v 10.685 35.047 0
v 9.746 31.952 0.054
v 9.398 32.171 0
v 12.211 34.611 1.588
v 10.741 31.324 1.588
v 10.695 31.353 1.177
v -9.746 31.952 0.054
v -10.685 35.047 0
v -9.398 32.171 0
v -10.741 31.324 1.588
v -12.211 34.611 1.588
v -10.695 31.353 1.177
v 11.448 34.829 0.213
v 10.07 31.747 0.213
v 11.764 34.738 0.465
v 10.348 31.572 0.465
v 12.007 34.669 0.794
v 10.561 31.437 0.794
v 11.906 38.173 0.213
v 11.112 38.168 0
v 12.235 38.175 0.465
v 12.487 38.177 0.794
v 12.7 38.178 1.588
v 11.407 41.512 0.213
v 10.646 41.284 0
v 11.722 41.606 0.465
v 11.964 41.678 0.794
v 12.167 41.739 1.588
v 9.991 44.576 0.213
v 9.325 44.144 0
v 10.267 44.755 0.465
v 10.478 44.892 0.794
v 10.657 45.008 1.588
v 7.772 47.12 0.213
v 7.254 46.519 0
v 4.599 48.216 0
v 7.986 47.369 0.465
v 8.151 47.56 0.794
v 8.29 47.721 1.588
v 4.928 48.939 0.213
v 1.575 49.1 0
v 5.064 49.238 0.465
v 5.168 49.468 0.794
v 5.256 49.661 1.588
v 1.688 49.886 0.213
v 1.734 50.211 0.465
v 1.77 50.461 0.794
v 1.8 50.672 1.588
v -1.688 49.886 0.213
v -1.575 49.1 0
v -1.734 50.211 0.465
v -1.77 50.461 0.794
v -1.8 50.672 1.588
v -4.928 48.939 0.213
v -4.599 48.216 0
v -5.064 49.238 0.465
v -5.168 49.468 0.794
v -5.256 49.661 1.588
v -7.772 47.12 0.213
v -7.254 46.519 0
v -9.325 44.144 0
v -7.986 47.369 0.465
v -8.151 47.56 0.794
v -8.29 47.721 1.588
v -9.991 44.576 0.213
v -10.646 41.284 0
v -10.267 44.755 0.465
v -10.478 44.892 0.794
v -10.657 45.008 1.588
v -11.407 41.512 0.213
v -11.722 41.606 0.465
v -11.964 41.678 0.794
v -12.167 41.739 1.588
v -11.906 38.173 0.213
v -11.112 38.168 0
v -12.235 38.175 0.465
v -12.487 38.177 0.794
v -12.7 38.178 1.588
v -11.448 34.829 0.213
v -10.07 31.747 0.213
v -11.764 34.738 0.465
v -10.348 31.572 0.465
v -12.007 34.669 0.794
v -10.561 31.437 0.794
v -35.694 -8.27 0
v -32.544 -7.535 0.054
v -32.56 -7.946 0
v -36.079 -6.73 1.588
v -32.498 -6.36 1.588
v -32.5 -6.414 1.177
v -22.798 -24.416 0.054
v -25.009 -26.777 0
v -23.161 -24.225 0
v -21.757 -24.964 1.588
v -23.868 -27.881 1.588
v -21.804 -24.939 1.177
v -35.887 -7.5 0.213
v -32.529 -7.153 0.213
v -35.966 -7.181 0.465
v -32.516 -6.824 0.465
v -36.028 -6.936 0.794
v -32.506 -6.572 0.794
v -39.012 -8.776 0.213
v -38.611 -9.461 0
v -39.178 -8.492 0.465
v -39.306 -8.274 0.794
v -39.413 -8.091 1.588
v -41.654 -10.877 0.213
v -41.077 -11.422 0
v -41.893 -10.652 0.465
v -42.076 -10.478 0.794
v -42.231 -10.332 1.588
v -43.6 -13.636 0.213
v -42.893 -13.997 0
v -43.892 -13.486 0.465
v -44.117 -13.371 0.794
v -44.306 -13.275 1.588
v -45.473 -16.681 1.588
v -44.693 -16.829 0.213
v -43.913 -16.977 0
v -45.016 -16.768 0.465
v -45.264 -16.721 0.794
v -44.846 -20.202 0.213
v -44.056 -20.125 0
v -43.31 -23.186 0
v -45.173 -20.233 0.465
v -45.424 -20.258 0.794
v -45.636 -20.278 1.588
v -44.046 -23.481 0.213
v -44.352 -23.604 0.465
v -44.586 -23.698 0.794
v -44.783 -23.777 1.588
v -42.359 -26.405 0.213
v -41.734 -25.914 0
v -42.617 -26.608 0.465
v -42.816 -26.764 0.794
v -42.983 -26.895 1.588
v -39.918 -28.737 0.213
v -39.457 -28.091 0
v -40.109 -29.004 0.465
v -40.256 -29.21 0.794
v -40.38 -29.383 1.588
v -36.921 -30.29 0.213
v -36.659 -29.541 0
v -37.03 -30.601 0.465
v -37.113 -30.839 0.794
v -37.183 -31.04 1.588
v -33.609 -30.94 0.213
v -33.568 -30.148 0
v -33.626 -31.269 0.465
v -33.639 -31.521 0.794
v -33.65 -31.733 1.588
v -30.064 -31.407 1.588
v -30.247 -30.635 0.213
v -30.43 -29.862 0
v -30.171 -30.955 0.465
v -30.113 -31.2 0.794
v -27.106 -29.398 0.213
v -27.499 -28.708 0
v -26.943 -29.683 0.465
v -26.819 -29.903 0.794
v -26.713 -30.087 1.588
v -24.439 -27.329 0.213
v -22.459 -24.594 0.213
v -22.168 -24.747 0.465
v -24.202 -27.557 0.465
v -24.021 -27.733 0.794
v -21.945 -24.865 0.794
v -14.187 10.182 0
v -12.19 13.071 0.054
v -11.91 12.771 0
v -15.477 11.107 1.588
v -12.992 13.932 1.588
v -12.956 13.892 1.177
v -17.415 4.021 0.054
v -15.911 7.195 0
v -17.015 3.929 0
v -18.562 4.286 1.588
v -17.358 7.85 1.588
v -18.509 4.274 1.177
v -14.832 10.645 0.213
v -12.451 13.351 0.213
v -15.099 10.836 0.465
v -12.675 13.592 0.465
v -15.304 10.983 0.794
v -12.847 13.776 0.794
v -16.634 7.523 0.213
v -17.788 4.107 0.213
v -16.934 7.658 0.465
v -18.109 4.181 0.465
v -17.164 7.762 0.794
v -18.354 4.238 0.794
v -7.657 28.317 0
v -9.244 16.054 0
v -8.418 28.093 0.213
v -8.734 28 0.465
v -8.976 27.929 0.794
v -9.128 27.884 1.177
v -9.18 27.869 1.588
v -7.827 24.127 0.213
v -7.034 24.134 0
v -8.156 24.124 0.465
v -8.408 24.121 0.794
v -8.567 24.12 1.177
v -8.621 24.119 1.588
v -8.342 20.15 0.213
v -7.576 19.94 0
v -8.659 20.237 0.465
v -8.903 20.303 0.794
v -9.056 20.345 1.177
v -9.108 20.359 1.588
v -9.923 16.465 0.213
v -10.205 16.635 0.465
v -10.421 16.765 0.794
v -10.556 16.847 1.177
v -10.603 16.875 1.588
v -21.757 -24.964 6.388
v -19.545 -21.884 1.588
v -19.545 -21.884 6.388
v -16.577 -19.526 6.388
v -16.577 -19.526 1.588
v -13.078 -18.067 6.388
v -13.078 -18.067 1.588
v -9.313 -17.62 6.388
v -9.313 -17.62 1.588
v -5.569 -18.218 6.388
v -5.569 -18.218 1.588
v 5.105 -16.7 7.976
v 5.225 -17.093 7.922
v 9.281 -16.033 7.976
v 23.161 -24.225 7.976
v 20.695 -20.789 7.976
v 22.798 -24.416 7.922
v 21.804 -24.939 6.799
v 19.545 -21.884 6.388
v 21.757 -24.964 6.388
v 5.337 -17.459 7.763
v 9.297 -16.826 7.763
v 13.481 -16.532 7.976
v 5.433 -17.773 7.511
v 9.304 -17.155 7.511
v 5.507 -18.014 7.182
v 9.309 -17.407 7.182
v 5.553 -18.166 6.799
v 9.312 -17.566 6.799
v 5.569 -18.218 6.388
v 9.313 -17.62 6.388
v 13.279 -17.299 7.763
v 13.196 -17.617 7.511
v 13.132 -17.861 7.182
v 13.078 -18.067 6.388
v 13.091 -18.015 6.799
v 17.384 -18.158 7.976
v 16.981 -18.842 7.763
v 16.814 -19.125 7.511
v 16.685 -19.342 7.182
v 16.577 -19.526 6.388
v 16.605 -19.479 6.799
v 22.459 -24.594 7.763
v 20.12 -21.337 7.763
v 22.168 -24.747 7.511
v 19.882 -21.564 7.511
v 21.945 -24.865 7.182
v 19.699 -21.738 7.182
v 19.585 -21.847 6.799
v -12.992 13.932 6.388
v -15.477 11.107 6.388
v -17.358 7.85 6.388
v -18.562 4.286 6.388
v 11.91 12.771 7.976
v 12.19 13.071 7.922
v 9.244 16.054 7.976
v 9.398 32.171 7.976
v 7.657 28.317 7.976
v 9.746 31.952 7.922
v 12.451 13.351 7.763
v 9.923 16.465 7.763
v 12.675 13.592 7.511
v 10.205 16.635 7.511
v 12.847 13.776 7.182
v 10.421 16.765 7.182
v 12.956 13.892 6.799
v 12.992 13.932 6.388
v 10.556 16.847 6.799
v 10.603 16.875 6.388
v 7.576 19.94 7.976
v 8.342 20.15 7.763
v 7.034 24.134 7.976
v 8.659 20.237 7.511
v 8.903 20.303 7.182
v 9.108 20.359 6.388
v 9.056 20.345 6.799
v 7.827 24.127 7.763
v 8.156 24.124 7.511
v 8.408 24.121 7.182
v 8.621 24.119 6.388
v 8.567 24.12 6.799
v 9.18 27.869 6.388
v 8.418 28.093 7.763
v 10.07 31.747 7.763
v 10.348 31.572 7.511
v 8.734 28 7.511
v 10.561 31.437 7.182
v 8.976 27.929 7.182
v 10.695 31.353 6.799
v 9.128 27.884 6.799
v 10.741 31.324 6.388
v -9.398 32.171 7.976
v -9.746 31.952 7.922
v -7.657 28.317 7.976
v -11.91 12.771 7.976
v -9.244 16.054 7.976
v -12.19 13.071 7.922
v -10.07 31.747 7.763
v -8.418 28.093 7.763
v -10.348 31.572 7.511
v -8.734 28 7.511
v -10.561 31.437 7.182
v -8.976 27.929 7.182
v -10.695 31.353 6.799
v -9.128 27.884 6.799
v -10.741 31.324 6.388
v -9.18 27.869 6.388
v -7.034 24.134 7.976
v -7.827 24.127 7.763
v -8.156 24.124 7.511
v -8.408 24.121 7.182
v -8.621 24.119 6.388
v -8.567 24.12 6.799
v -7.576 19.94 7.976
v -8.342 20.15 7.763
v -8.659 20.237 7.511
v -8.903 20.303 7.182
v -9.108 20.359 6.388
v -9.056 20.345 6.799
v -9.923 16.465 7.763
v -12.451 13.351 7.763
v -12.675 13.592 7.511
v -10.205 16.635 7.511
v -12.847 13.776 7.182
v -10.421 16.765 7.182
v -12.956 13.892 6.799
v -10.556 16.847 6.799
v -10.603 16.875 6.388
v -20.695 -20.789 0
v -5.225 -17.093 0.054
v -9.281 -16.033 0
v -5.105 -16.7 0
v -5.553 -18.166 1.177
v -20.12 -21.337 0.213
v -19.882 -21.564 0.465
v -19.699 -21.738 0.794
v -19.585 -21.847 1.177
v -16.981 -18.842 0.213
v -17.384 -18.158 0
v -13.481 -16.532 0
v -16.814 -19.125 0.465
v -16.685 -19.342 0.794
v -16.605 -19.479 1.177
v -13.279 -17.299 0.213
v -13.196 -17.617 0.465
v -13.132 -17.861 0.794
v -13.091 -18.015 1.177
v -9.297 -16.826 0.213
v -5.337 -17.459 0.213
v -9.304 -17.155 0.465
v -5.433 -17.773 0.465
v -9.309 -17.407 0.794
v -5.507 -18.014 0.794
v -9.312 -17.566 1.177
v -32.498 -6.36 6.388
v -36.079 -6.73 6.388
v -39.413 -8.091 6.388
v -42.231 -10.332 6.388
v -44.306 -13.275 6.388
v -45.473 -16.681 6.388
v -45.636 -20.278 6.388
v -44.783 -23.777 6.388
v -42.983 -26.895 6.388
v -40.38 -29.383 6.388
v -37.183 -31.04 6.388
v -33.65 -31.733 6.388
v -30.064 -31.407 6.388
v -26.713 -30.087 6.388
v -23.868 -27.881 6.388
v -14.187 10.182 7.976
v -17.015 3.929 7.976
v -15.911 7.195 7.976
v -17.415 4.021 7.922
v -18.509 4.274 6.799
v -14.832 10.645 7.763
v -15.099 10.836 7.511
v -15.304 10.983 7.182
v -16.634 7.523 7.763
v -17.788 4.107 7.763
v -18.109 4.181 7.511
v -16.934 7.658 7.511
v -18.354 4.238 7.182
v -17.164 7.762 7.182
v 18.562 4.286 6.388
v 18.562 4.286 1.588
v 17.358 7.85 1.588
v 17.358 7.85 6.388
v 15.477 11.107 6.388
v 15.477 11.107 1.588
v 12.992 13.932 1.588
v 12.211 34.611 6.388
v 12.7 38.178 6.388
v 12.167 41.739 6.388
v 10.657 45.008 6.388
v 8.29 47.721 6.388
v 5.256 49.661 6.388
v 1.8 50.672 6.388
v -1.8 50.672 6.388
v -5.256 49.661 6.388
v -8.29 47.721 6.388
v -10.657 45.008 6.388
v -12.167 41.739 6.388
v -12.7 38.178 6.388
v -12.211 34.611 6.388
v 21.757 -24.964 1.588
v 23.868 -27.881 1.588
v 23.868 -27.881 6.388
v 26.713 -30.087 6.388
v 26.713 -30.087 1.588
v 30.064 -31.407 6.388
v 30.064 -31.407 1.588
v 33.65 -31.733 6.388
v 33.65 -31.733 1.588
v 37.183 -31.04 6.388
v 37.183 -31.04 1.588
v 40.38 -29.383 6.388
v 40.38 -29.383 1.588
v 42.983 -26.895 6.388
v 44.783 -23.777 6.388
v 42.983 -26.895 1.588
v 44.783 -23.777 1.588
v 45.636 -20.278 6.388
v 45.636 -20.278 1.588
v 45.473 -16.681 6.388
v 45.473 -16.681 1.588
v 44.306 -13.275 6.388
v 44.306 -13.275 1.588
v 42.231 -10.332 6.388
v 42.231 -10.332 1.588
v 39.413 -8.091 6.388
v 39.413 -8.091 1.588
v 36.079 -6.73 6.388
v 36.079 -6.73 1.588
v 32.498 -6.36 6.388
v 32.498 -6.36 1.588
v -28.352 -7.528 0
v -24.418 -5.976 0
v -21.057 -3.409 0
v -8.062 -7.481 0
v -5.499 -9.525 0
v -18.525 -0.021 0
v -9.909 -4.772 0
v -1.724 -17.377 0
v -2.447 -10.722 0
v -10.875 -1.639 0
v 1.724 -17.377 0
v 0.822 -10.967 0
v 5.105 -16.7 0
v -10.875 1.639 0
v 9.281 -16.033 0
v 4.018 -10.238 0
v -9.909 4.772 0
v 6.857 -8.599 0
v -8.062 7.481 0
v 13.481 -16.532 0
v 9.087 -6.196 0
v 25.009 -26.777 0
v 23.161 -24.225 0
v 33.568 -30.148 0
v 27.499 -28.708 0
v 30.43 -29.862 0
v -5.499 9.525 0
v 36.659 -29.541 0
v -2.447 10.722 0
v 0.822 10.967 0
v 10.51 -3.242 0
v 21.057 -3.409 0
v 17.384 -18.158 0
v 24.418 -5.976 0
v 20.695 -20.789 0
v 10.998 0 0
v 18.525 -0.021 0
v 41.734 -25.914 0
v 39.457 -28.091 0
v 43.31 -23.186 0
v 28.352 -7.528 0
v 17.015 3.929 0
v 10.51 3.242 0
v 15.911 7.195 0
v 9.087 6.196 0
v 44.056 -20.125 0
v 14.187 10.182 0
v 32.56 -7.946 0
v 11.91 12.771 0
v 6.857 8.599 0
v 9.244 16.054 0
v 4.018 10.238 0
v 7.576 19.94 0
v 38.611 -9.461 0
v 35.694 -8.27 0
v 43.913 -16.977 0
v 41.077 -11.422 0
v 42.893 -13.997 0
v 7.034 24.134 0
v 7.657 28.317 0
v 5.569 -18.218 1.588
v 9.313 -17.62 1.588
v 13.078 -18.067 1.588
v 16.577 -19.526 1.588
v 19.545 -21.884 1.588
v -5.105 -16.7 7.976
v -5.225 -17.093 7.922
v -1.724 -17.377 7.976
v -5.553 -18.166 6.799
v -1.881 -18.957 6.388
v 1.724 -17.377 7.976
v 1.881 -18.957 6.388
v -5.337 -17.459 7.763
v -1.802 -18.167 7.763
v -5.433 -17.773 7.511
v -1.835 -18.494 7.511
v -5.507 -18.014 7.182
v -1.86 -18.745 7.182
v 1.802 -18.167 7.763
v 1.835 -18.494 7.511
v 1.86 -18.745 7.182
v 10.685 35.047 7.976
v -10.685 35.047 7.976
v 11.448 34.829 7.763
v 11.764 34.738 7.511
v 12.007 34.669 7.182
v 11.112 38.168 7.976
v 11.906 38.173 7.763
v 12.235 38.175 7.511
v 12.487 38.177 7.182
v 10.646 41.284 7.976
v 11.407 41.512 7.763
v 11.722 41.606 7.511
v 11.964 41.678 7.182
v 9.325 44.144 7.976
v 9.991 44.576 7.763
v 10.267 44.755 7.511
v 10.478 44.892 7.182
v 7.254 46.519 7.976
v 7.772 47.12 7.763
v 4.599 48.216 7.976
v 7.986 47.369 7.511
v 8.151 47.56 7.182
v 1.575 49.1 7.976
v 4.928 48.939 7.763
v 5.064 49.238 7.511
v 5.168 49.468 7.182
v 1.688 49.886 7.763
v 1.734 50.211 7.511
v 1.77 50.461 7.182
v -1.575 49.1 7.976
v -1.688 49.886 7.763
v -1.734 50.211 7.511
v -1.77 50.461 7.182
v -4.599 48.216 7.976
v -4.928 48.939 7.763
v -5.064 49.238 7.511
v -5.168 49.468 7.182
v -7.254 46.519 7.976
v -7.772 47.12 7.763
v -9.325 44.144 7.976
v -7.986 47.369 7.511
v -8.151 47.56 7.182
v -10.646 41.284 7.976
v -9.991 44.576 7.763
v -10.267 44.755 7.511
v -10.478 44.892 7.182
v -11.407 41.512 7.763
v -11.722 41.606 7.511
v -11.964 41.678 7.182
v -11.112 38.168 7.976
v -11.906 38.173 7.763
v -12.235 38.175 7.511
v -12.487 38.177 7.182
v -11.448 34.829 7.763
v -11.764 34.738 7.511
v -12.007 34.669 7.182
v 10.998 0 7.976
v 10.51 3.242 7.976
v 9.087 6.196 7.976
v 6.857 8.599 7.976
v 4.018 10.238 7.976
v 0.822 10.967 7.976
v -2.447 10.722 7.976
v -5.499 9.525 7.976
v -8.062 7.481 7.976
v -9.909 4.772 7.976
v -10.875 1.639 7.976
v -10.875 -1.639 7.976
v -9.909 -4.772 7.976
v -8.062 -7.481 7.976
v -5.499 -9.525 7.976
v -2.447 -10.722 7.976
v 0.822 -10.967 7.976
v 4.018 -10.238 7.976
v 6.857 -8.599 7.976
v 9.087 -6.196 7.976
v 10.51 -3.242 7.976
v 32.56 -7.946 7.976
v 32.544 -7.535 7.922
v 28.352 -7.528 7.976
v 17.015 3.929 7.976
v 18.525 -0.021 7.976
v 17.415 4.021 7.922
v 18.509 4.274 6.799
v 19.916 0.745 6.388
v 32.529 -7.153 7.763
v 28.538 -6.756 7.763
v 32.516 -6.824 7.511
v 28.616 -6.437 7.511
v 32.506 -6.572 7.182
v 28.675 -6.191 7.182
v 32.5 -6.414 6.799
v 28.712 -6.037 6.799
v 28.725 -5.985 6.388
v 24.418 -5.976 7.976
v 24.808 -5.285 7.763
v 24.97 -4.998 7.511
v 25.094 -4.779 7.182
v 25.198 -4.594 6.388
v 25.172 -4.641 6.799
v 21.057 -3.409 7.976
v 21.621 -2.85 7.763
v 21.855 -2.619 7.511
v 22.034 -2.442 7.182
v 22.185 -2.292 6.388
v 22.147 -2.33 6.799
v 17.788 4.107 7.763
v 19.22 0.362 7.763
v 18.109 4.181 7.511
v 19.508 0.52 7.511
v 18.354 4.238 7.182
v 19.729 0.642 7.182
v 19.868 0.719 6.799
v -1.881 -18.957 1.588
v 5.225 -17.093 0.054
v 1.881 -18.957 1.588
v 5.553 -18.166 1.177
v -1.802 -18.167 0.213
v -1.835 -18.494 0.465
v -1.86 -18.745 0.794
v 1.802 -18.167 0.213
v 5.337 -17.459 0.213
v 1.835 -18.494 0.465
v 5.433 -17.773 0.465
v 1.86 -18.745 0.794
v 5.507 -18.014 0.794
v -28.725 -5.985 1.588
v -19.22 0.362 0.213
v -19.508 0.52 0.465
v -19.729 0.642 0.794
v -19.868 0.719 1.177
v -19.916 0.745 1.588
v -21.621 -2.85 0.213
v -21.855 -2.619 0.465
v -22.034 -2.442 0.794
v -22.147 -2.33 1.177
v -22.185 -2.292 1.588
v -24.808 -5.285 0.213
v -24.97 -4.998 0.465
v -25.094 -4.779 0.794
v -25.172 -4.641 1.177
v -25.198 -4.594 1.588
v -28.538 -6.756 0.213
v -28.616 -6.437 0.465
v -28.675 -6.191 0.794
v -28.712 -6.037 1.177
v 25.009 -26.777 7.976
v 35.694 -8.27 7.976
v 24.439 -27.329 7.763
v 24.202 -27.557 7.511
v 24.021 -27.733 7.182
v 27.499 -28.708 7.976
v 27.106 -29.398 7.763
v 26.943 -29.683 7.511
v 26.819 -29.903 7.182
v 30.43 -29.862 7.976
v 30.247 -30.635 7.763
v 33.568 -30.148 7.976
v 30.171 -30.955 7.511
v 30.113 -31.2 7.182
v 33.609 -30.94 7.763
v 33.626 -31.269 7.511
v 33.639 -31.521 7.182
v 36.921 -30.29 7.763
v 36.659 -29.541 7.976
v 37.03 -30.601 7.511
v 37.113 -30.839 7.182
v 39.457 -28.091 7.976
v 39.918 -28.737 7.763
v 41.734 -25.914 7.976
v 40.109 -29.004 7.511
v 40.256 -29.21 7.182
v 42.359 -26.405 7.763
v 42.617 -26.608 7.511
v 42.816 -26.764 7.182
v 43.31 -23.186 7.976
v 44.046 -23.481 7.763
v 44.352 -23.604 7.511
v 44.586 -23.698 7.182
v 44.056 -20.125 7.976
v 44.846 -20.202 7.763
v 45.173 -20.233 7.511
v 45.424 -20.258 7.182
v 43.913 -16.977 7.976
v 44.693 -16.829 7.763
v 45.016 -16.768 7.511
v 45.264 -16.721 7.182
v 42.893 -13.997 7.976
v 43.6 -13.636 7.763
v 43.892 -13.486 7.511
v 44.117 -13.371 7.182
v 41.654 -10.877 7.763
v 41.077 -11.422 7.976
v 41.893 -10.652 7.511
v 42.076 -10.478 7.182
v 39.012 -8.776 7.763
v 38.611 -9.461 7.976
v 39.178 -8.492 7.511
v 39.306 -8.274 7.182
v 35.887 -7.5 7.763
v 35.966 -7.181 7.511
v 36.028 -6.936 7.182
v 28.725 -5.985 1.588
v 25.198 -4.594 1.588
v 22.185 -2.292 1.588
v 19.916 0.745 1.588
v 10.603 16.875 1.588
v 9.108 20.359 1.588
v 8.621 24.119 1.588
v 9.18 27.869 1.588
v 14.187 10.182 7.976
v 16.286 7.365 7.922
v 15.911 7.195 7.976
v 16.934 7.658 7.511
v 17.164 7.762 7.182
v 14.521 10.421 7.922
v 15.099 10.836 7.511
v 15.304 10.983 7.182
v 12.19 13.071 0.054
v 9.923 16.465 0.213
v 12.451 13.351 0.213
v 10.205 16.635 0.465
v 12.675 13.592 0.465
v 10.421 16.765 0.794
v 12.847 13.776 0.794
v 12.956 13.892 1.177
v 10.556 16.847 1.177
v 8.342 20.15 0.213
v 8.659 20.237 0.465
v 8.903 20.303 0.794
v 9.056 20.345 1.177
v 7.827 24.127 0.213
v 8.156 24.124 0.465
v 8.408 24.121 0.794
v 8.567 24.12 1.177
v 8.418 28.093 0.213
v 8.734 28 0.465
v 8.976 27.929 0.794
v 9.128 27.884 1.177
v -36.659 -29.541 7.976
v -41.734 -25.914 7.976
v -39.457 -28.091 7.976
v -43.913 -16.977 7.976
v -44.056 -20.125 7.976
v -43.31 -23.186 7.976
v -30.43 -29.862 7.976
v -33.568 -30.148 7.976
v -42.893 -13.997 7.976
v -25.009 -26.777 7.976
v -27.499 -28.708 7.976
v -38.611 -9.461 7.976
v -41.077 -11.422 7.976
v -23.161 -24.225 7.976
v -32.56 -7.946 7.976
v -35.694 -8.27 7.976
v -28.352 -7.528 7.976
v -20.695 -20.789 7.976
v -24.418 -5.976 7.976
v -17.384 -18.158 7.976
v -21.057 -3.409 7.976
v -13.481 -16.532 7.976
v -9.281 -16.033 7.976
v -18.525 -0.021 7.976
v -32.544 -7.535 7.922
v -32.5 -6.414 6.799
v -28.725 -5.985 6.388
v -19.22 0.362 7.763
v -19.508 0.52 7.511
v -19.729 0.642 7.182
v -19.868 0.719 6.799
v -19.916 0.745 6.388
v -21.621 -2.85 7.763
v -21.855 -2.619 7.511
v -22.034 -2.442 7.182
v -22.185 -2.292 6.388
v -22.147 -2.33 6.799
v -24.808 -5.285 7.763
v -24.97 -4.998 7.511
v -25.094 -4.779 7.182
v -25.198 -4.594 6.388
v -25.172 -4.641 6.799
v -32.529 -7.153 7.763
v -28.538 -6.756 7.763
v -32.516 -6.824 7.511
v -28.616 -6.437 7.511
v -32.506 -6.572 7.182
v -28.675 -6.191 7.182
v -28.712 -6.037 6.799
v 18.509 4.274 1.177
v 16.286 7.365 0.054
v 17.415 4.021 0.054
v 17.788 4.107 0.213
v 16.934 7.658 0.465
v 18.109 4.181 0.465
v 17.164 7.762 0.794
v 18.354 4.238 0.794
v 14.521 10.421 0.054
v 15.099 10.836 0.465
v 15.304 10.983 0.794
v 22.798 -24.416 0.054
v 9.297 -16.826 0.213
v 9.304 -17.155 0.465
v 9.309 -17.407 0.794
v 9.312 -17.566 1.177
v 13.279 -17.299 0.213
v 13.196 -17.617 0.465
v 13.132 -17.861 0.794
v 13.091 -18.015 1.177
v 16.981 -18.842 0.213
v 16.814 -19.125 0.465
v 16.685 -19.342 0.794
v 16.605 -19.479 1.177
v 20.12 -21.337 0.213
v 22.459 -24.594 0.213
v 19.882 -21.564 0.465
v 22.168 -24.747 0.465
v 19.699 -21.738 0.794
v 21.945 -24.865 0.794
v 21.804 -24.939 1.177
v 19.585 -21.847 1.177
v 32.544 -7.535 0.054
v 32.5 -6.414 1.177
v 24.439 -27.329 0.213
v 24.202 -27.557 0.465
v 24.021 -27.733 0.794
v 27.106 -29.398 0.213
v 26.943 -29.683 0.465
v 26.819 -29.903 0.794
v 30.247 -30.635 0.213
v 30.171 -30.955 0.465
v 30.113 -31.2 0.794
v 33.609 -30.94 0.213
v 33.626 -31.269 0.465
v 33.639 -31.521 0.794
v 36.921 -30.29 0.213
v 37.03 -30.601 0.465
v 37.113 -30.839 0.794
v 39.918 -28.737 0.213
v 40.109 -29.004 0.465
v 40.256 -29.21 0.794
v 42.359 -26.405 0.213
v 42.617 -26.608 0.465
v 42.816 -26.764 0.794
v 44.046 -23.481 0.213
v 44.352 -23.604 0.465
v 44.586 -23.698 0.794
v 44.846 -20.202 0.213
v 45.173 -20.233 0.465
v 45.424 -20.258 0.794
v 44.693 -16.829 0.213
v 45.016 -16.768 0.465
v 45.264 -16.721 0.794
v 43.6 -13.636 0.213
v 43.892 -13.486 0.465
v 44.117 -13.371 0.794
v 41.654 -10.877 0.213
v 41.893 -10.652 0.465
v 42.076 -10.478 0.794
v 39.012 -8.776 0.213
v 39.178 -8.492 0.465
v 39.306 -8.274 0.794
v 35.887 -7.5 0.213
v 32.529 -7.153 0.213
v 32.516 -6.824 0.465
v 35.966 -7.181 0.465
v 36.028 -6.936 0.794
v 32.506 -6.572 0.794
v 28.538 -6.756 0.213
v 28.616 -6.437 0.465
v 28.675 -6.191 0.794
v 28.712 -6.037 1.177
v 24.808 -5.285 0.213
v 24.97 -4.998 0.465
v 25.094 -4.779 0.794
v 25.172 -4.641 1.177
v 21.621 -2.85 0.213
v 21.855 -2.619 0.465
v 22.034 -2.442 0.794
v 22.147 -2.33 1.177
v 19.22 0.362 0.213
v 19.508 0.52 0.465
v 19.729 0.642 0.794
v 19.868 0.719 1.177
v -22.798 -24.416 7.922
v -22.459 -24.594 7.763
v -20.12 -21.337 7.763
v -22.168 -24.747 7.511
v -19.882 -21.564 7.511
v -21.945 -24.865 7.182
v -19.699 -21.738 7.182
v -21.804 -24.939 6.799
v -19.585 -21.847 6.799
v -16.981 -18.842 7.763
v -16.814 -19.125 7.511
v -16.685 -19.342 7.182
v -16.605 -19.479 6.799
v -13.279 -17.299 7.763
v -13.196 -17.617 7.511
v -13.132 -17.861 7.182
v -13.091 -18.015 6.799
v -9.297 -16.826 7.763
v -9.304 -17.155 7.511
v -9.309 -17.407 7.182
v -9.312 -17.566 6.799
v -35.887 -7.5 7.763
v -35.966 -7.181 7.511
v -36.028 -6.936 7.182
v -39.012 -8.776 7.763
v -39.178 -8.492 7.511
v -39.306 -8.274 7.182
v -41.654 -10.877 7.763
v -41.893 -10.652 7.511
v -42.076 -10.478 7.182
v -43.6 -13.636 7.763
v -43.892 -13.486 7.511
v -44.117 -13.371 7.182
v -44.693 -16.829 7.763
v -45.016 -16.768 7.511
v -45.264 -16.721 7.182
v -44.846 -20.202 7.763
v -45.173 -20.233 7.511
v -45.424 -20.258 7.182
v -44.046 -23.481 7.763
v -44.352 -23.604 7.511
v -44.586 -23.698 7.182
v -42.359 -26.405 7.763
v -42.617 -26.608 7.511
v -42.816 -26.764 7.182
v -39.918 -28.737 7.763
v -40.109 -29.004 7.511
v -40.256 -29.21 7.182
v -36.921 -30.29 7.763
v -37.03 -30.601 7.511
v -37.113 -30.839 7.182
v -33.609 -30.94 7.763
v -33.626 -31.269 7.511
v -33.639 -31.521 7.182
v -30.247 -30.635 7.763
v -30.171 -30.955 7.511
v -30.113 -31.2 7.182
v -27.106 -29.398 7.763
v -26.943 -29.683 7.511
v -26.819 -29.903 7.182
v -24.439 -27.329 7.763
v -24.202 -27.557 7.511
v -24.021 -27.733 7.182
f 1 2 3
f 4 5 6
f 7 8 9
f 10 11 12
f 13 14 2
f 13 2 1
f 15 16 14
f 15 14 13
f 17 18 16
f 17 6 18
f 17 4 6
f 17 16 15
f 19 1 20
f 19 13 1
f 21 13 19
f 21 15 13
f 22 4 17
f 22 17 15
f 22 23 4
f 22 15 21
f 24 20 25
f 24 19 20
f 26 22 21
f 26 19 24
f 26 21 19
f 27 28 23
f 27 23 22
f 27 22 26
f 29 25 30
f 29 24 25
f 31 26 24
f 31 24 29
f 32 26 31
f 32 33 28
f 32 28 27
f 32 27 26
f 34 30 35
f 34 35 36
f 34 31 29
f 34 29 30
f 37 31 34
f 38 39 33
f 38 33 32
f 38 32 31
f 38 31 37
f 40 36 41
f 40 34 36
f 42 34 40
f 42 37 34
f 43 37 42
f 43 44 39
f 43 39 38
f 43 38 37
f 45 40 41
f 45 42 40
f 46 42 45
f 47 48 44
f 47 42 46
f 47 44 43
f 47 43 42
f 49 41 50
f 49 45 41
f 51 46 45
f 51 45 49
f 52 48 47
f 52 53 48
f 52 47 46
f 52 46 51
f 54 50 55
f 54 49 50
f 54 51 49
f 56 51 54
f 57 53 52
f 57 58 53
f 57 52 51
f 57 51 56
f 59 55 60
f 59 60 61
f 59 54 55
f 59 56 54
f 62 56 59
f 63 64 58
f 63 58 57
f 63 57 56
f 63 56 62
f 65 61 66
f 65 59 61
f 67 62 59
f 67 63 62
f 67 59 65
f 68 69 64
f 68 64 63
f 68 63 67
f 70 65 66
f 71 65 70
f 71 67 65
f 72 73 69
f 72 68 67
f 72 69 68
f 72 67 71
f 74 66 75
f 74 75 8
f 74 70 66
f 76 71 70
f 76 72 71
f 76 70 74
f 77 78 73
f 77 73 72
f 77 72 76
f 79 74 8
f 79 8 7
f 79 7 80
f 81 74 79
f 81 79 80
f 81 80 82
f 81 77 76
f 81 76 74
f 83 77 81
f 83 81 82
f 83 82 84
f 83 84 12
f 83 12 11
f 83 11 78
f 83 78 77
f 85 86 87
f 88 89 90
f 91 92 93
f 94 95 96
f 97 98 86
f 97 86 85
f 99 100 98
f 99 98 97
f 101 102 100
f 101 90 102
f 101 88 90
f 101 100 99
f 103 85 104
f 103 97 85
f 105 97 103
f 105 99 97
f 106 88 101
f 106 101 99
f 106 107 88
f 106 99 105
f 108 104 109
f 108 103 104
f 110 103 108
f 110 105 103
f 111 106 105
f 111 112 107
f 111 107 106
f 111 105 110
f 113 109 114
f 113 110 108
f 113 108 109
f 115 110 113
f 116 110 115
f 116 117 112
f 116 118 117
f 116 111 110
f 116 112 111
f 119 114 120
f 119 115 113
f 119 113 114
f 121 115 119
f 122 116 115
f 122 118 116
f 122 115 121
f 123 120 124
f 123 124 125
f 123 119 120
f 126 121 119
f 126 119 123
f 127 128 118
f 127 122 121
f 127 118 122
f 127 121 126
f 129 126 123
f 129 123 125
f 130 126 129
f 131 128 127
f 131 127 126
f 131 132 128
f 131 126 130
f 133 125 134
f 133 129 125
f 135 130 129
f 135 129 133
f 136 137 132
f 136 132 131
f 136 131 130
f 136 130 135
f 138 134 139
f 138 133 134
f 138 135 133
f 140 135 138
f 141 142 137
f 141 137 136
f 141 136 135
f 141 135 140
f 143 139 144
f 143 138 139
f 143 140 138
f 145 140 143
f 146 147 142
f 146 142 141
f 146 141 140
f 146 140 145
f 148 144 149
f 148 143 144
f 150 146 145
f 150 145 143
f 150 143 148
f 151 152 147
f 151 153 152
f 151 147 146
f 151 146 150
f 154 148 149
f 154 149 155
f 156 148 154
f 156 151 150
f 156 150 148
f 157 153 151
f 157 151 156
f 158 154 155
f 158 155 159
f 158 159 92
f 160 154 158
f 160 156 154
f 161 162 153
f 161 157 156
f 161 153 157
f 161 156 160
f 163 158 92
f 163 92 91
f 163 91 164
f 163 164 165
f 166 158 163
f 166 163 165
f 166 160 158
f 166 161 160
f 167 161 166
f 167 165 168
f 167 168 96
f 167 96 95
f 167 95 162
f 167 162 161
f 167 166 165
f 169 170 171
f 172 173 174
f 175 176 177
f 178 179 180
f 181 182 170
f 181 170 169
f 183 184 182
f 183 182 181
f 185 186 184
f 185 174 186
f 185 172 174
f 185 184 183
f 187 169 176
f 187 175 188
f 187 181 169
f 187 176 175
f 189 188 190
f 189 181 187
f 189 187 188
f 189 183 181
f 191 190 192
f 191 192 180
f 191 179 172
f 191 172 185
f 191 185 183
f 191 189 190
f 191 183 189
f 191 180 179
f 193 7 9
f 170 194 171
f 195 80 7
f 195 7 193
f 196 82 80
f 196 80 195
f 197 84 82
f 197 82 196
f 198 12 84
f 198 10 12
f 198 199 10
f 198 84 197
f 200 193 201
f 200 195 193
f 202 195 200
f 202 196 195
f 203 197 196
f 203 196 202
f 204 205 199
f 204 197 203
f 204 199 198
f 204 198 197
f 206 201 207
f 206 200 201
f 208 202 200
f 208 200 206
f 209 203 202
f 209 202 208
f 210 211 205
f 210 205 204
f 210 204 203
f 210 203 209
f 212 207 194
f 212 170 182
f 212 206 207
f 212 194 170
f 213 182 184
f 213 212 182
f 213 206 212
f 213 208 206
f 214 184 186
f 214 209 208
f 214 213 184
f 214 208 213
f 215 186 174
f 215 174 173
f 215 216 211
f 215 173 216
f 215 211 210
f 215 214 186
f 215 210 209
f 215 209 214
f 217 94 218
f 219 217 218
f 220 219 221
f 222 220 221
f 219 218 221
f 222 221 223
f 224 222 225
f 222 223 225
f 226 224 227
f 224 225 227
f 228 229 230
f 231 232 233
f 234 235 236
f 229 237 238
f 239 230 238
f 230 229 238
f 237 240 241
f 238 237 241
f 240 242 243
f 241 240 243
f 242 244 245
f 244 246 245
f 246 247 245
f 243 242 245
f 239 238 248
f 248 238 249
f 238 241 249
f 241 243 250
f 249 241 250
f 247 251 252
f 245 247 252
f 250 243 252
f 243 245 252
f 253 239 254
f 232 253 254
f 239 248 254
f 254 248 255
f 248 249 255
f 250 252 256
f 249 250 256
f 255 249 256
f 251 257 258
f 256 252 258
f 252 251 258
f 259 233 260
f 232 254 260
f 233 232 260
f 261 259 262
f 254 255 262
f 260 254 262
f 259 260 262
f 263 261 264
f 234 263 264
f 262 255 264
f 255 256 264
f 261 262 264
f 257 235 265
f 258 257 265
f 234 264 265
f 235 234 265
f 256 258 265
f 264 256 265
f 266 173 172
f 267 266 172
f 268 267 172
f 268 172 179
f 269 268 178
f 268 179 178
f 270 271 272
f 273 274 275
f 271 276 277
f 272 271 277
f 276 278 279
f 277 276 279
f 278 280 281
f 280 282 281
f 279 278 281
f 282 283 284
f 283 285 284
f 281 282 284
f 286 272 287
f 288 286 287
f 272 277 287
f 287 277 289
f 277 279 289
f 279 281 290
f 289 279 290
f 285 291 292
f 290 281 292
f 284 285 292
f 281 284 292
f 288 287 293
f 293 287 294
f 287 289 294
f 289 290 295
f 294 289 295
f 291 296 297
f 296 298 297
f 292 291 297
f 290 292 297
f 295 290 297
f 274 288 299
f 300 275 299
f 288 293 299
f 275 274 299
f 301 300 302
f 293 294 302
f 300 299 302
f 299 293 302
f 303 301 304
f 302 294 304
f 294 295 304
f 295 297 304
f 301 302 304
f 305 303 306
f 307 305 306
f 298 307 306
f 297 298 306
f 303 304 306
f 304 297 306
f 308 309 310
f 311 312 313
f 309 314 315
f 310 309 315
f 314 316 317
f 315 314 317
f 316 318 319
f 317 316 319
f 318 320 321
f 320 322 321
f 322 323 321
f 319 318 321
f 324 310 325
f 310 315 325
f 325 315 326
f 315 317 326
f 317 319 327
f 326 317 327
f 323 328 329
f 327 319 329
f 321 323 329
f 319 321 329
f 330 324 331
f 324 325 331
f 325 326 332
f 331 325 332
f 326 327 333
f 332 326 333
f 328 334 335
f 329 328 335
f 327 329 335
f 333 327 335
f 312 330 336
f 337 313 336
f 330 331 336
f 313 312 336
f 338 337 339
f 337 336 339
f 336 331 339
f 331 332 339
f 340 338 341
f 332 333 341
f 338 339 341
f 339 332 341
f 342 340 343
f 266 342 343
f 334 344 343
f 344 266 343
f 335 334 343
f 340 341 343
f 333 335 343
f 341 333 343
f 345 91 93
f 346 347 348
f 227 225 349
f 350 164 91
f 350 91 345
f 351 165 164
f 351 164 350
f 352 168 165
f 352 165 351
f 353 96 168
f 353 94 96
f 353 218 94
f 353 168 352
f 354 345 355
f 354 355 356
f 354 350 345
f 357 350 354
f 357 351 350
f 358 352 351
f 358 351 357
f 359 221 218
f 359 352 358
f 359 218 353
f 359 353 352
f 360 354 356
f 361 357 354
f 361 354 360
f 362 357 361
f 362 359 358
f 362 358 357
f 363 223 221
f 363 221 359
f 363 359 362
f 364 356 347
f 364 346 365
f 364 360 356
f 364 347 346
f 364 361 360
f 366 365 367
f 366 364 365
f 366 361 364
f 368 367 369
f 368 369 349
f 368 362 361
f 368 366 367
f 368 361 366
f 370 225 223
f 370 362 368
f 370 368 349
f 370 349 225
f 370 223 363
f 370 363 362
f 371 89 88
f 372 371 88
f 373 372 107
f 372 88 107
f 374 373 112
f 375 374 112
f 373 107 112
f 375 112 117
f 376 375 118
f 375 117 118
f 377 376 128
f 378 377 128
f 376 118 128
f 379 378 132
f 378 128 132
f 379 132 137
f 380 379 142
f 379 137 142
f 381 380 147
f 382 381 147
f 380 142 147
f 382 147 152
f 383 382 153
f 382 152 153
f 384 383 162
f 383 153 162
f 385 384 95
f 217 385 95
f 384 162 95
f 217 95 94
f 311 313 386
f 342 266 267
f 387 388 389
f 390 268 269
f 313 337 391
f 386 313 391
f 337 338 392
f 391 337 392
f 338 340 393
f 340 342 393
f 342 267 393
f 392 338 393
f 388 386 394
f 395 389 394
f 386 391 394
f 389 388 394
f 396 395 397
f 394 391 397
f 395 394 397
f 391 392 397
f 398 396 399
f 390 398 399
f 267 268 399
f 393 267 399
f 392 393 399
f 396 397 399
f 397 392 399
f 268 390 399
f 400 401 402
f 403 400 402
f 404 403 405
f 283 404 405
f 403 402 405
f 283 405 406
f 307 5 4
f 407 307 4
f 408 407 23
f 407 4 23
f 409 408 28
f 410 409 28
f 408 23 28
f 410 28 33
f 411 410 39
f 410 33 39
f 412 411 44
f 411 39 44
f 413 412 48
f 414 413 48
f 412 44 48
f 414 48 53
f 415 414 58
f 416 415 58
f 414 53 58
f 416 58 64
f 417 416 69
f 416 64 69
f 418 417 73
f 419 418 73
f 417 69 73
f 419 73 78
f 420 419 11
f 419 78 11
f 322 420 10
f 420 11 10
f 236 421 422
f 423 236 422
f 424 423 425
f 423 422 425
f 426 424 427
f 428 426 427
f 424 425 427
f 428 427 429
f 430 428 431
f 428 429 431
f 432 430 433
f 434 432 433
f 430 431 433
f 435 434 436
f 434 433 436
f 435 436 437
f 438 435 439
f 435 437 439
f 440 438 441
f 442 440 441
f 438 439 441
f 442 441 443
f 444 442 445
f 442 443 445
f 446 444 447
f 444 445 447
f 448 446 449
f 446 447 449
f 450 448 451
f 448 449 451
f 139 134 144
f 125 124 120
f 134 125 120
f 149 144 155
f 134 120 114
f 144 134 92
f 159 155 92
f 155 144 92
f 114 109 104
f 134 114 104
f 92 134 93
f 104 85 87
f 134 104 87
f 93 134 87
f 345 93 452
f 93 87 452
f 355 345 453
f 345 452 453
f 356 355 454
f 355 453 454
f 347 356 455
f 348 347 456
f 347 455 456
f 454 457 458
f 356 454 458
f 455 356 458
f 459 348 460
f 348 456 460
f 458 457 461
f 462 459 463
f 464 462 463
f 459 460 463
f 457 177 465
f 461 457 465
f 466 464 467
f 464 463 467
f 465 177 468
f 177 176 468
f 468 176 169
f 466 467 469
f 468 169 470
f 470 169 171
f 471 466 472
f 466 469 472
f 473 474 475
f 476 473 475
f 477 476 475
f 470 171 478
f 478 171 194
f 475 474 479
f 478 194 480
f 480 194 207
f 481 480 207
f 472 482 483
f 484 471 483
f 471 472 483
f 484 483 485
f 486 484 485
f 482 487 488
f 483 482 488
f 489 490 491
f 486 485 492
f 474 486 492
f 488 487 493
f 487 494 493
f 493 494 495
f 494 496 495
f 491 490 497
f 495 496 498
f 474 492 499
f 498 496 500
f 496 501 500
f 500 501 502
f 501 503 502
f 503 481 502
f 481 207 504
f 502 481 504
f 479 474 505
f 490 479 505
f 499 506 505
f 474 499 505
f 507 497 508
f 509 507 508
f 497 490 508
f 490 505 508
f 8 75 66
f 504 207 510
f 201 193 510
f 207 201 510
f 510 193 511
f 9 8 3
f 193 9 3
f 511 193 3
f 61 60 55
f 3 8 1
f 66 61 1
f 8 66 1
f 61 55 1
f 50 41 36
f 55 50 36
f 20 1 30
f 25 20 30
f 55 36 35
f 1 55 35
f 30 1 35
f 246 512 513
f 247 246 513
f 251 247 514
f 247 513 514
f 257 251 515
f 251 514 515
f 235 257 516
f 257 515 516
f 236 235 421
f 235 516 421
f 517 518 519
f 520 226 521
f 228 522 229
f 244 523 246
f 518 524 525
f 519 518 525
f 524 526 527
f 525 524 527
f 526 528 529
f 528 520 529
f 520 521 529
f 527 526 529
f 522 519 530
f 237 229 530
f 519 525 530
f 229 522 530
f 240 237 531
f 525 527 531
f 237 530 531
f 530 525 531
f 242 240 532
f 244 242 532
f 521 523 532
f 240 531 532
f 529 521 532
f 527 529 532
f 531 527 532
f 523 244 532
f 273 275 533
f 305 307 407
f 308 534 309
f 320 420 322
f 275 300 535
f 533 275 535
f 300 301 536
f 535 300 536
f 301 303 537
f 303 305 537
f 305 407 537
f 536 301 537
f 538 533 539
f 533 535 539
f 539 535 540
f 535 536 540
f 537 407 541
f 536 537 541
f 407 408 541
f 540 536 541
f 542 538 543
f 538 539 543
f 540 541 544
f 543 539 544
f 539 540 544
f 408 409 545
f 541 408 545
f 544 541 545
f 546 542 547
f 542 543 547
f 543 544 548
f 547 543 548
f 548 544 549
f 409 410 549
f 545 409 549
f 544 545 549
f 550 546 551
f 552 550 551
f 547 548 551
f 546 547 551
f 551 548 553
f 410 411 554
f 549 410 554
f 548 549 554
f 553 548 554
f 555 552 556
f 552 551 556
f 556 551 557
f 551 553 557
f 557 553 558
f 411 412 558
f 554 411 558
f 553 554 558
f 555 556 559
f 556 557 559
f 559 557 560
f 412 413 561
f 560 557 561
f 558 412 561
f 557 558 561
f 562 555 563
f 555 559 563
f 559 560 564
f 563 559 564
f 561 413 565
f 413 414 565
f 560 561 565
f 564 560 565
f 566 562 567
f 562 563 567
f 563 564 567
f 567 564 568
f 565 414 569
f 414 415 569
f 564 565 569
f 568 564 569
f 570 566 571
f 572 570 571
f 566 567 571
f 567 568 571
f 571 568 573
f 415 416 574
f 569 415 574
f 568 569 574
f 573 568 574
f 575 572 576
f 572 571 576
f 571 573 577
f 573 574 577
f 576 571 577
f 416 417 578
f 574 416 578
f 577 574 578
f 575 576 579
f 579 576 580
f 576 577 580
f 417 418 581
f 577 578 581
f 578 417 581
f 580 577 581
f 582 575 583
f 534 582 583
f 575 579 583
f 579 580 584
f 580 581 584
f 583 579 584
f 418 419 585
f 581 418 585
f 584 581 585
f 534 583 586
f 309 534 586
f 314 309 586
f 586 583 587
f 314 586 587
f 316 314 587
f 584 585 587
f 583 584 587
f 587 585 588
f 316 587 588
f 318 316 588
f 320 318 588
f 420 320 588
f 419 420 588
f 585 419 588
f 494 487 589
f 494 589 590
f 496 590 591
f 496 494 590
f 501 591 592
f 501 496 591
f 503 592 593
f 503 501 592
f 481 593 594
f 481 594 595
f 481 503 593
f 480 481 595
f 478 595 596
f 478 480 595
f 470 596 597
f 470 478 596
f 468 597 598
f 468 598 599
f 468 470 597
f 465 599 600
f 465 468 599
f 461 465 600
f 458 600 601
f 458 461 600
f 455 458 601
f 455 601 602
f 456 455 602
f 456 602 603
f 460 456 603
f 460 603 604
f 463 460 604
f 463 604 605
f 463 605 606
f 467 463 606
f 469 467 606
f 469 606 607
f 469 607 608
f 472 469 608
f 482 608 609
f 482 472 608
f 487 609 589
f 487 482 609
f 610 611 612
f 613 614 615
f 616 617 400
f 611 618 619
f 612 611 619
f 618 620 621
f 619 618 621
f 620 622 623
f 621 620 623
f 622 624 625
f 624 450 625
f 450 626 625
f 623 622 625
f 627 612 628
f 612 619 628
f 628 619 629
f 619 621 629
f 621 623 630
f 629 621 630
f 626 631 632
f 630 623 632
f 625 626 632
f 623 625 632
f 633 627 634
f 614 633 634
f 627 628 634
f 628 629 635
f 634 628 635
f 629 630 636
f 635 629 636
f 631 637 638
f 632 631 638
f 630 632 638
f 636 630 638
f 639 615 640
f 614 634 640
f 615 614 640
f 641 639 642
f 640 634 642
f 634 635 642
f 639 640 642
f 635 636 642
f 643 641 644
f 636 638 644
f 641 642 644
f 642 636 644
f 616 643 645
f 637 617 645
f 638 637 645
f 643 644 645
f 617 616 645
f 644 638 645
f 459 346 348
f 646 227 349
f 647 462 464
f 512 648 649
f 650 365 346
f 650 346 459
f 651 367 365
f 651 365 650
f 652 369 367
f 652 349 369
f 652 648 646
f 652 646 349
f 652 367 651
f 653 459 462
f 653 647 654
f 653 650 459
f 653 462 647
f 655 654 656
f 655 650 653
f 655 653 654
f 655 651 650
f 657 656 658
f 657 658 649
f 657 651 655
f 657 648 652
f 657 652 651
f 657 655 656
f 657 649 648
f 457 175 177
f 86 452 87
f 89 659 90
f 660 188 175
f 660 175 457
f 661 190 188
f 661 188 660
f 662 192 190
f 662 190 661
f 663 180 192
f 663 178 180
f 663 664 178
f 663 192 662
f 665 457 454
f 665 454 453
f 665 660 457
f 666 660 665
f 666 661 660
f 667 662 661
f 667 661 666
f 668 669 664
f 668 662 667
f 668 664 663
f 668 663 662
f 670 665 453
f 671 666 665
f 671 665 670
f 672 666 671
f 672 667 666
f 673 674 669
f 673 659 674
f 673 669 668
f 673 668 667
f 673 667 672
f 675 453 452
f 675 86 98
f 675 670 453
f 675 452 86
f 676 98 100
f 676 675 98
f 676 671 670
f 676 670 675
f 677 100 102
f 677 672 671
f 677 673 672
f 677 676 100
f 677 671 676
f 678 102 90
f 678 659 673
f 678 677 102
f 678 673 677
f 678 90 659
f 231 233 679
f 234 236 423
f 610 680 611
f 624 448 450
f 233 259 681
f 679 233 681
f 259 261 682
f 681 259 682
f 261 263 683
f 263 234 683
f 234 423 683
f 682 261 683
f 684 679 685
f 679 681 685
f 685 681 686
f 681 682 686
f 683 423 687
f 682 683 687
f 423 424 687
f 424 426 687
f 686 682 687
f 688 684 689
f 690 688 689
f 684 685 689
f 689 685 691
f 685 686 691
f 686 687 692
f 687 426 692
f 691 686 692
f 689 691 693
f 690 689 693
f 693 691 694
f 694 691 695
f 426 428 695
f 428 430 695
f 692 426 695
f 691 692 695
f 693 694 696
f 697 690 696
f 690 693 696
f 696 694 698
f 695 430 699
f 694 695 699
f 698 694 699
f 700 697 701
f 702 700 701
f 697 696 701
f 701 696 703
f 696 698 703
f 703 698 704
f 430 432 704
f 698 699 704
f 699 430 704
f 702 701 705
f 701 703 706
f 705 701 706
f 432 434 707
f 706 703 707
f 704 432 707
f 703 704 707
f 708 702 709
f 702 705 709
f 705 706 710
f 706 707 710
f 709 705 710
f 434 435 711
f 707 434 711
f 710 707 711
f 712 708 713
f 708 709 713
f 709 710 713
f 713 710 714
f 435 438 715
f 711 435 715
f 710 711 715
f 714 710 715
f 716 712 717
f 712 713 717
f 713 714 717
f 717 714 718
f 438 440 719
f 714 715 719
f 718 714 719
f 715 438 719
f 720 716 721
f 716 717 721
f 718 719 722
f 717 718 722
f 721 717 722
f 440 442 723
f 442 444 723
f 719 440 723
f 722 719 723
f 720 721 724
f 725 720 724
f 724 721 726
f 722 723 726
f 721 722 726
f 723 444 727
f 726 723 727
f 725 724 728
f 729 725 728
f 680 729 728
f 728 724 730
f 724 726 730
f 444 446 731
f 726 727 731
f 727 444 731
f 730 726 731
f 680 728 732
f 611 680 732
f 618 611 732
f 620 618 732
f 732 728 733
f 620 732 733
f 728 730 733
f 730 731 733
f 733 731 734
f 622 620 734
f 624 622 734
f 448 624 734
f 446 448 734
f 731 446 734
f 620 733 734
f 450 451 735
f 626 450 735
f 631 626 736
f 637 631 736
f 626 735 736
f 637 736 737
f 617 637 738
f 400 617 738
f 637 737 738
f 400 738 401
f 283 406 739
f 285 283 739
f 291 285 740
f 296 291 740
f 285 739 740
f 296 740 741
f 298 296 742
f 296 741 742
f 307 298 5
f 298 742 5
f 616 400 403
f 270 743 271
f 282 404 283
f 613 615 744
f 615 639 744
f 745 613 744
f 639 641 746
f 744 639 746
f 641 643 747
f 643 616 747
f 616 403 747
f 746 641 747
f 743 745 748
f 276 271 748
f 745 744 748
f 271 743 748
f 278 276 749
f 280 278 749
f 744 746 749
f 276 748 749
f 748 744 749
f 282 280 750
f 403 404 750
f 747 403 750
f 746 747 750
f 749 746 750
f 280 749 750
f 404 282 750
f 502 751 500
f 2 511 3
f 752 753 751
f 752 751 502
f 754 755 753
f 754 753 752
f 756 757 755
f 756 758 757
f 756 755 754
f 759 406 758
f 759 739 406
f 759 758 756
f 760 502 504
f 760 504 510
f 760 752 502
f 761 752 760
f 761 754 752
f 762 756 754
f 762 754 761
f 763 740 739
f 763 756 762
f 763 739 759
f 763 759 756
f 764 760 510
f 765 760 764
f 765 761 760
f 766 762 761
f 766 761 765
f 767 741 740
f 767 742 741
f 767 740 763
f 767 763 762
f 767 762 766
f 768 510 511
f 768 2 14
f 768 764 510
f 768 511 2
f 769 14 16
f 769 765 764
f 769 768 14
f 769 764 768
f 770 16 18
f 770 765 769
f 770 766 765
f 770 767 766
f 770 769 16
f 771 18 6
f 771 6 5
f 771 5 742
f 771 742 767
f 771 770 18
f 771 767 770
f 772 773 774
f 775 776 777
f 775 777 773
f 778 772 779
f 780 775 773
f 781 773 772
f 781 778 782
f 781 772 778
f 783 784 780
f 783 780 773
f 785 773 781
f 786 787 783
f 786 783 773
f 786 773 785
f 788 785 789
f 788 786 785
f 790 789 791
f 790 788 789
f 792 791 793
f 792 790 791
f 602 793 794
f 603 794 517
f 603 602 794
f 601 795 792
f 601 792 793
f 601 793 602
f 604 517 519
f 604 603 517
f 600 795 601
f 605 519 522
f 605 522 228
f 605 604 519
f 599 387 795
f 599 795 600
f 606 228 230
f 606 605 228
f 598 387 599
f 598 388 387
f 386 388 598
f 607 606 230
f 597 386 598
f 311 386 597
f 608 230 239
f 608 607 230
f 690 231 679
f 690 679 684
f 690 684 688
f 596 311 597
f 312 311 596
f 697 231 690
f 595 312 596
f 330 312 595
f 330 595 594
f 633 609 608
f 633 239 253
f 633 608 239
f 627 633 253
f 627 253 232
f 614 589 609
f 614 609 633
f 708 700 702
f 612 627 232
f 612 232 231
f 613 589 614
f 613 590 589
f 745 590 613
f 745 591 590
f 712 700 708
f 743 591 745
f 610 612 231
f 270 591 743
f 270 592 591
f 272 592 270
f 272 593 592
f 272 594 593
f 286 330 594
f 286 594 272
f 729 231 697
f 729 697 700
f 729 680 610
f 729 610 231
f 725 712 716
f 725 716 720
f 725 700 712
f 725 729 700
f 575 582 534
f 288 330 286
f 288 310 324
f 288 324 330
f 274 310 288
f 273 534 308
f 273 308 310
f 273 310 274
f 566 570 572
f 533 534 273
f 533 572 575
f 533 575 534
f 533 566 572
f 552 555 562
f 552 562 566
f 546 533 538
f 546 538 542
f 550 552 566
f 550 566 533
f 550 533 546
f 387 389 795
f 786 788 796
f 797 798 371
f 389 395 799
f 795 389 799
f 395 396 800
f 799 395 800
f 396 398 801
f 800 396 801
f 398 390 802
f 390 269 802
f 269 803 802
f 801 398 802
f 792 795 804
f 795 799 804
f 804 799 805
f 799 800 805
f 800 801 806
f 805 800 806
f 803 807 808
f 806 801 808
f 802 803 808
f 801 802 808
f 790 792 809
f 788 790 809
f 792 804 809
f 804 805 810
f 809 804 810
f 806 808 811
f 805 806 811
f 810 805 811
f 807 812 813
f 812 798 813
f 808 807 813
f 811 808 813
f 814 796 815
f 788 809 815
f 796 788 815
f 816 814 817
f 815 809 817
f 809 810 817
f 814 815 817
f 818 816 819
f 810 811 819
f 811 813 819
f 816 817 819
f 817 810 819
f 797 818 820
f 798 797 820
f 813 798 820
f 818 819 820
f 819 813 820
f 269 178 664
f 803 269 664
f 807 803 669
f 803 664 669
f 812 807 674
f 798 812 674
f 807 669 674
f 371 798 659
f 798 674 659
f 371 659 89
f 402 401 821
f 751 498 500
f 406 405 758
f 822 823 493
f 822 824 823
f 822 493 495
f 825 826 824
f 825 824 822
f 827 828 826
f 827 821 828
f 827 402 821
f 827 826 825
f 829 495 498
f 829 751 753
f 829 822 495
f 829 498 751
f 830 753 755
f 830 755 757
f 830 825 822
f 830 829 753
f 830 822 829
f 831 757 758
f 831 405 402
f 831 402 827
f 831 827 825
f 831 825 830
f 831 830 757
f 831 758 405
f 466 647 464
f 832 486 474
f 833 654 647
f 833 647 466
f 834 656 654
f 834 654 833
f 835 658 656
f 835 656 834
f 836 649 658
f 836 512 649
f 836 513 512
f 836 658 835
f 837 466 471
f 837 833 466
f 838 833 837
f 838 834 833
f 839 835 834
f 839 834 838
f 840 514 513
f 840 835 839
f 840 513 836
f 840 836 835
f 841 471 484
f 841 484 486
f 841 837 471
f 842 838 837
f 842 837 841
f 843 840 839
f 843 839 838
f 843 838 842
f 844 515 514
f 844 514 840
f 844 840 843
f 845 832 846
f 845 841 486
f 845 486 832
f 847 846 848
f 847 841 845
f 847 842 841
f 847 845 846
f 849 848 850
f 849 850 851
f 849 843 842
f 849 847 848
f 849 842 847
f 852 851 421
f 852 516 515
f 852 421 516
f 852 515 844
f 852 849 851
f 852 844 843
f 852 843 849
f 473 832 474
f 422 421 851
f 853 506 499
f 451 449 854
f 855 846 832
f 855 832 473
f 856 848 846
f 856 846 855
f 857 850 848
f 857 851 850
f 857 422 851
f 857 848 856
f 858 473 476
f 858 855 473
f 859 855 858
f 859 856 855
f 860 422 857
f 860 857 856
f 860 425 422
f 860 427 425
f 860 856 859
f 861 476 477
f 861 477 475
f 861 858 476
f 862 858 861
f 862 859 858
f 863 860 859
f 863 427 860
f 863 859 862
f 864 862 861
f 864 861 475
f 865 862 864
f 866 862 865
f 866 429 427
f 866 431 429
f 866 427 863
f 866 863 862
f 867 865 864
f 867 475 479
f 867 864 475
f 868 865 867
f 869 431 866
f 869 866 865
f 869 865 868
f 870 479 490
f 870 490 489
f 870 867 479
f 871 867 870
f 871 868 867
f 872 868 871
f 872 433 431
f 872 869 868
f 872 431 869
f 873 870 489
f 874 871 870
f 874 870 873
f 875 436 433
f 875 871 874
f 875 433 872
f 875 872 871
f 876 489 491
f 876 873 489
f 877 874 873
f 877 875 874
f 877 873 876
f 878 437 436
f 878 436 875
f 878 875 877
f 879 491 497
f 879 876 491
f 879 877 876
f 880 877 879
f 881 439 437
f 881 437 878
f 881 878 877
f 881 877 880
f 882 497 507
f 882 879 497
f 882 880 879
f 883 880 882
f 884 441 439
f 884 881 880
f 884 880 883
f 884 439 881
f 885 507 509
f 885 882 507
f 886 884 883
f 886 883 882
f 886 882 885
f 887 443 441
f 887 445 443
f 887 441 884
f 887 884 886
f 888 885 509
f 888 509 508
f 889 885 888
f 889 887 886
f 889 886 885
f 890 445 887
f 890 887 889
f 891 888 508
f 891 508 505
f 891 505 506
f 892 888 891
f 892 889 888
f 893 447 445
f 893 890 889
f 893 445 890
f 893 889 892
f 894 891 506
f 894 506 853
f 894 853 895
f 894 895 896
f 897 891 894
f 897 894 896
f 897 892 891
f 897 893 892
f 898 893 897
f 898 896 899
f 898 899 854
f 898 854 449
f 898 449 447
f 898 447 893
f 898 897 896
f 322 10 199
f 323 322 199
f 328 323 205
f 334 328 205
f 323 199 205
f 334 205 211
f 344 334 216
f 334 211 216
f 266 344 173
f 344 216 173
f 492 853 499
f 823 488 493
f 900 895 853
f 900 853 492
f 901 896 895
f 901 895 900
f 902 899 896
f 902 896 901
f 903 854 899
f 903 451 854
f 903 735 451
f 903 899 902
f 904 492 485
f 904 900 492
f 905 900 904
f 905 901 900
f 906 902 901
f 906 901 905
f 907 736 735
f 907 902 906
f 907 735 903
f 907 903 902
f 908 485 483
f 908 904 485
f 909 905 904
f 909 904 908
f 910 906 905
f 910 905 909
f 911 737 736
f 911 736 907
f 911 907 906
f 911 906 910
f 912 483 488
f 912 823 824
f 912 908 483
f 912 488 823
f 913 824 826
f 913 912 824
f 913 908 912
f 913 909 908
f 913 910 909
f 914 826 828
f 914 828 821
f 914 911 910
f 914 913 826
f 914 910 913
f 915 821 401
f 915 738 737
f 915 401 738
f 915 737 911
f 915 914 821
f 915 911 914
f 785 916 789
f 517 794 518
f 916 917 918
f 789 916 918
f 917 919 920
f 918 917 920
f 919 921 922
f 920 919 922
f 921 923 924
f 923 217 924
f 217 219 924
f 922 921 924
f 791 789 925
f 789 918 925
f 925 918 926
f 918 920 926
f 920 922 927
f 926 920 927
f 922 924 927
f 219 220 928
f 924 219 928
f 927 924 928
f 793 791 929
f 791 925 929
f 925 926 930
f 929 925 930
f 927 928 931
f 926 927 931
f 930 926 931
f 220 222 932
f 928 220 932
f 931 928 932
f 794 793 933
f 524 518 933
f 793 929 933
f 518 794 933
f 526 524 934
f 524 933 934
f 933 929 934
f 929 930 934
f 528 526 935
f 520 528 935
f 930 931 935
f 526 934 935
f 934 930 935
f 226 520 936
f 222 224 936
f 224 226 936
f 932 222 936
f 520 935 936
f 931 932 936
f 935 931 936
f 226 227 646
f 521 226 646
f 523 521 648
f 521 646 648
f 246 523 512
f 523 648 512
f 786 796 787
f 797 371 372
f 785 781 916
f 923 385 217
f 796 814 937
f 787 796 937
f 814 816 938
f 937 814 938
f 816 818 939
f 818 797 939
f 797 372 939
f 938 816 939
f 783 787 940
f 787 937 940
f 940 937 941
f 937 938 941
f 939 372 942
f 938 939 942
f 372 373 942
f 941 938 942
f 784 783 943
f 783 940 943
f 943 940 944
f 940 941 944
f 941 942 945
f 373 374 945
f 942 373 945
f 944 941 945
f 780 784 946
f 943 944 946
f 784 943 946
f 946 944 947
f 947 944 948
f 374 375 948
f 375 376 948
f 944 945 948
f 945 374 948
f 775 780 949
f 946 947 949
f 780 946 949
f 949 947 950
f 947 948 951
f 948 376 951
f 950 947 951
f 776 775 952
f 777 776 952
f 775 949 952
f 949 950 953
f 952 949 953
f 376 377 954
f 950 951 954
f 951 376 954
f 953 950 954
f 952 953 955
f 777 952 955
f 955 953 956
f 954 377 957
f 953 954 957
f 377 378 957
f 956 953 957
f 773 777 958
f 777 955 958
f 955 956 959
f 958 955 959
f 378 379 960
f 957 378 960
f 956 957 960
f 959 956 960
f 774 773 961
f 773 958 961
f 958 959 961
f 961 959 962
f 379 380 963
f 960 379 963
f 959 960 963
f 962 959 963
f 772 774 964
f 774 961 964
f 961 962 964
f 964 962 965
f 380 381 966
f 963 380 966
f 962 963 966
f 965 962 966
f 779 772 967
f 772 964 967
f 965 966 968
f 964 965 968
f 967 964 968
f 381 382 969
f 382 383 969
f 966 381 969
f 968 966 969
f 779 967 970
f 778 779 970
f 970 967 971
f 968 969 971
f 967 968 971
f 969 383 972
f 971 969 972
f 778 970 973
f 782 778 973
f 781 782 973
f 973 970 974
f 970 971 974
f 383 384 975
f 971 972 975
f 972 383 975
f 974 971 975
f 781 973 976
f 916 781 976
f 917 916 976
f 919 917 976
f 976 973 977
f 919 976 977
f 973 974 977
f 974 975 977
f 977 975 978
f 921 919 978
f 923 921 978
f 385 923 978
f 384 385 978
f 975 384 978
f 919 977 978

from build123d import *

# Parameters (mm, degrees)
F0_R     = 19.05
F0_R_2   = 10.9982
F1_DEPTH = 7.9756
F3_DEPTH = 7.9756
F4_R     = 1.5875


with BuildPart() as f1:
    # F0 (on Top) → F1 (new body)
    with BuildSketch(Plane.XY):
        Circle(F0_R)
        Circle(F0_R_2, mode=Mode.SUBTRACT)
    extrude(amount=F1_DEPTH)

    # F2 (on Top) → F3 (join)
    with BuildSketch(Plane.XY):
        with BuildLine():
            ThreePointArc((12.992472, 13.931912), (8.734155, 22.222298), (10.741134, 31.323715))
            ThreePointArc((10.741134, 31.323715), (0, 50.8), (-10.741134, 31.323715))
            ThreePointArc((-10.741134, 31.323715), (-8.734155, 22.222298), (-12.992472, 13.931912))
            Line((-12.992472, 13.931912), (12.992472, 13.931912))
        make_face()
        with BuildLine():
            ThreePointArc((-21.756566, -24.963952), (-14.877996, -18.675149), (-5.569153, -18.217767))
            Line((-5.569153, -18.217767), (-18.561626, 4.285855))
            ThreePointArc((-18.561626, 4.285855), (-23.612152, -3.547148), (-32.4977, -6.359763))
            ThreePointArc((-32.4977, -6.359763), (-43.994091, -25.4), (-21.756566, -24.963952))
        make_face()
        with BuildLine():
            ThreePointArc((32.4977, -6.359763), (23.612152, -3.547148), (18.561626, 4.285855))
            Line((18.561626, 4.285855), (5.569153, -18.217767))
            ThreePointArc((5.569153, -18.217767), (14.877996, -18.675149), (21.756566, -24.963952))
            ThreePointArc((21.756566, -24.963952), (43.994091, -25.4), (32.4977, -6.359763))
        make_face()
    extrude(amount=F3_DEPTH)

    # F4
    f4_edges = [f1.edges().sort_by_distance(p)[0] for p in [
        (-14.877996, -18.675149, 7.9756),
        (-14.877996, -18.675149, 0),
    ]]
    fillet(f4_edges, radius=F4_R)


solid = f1.part
